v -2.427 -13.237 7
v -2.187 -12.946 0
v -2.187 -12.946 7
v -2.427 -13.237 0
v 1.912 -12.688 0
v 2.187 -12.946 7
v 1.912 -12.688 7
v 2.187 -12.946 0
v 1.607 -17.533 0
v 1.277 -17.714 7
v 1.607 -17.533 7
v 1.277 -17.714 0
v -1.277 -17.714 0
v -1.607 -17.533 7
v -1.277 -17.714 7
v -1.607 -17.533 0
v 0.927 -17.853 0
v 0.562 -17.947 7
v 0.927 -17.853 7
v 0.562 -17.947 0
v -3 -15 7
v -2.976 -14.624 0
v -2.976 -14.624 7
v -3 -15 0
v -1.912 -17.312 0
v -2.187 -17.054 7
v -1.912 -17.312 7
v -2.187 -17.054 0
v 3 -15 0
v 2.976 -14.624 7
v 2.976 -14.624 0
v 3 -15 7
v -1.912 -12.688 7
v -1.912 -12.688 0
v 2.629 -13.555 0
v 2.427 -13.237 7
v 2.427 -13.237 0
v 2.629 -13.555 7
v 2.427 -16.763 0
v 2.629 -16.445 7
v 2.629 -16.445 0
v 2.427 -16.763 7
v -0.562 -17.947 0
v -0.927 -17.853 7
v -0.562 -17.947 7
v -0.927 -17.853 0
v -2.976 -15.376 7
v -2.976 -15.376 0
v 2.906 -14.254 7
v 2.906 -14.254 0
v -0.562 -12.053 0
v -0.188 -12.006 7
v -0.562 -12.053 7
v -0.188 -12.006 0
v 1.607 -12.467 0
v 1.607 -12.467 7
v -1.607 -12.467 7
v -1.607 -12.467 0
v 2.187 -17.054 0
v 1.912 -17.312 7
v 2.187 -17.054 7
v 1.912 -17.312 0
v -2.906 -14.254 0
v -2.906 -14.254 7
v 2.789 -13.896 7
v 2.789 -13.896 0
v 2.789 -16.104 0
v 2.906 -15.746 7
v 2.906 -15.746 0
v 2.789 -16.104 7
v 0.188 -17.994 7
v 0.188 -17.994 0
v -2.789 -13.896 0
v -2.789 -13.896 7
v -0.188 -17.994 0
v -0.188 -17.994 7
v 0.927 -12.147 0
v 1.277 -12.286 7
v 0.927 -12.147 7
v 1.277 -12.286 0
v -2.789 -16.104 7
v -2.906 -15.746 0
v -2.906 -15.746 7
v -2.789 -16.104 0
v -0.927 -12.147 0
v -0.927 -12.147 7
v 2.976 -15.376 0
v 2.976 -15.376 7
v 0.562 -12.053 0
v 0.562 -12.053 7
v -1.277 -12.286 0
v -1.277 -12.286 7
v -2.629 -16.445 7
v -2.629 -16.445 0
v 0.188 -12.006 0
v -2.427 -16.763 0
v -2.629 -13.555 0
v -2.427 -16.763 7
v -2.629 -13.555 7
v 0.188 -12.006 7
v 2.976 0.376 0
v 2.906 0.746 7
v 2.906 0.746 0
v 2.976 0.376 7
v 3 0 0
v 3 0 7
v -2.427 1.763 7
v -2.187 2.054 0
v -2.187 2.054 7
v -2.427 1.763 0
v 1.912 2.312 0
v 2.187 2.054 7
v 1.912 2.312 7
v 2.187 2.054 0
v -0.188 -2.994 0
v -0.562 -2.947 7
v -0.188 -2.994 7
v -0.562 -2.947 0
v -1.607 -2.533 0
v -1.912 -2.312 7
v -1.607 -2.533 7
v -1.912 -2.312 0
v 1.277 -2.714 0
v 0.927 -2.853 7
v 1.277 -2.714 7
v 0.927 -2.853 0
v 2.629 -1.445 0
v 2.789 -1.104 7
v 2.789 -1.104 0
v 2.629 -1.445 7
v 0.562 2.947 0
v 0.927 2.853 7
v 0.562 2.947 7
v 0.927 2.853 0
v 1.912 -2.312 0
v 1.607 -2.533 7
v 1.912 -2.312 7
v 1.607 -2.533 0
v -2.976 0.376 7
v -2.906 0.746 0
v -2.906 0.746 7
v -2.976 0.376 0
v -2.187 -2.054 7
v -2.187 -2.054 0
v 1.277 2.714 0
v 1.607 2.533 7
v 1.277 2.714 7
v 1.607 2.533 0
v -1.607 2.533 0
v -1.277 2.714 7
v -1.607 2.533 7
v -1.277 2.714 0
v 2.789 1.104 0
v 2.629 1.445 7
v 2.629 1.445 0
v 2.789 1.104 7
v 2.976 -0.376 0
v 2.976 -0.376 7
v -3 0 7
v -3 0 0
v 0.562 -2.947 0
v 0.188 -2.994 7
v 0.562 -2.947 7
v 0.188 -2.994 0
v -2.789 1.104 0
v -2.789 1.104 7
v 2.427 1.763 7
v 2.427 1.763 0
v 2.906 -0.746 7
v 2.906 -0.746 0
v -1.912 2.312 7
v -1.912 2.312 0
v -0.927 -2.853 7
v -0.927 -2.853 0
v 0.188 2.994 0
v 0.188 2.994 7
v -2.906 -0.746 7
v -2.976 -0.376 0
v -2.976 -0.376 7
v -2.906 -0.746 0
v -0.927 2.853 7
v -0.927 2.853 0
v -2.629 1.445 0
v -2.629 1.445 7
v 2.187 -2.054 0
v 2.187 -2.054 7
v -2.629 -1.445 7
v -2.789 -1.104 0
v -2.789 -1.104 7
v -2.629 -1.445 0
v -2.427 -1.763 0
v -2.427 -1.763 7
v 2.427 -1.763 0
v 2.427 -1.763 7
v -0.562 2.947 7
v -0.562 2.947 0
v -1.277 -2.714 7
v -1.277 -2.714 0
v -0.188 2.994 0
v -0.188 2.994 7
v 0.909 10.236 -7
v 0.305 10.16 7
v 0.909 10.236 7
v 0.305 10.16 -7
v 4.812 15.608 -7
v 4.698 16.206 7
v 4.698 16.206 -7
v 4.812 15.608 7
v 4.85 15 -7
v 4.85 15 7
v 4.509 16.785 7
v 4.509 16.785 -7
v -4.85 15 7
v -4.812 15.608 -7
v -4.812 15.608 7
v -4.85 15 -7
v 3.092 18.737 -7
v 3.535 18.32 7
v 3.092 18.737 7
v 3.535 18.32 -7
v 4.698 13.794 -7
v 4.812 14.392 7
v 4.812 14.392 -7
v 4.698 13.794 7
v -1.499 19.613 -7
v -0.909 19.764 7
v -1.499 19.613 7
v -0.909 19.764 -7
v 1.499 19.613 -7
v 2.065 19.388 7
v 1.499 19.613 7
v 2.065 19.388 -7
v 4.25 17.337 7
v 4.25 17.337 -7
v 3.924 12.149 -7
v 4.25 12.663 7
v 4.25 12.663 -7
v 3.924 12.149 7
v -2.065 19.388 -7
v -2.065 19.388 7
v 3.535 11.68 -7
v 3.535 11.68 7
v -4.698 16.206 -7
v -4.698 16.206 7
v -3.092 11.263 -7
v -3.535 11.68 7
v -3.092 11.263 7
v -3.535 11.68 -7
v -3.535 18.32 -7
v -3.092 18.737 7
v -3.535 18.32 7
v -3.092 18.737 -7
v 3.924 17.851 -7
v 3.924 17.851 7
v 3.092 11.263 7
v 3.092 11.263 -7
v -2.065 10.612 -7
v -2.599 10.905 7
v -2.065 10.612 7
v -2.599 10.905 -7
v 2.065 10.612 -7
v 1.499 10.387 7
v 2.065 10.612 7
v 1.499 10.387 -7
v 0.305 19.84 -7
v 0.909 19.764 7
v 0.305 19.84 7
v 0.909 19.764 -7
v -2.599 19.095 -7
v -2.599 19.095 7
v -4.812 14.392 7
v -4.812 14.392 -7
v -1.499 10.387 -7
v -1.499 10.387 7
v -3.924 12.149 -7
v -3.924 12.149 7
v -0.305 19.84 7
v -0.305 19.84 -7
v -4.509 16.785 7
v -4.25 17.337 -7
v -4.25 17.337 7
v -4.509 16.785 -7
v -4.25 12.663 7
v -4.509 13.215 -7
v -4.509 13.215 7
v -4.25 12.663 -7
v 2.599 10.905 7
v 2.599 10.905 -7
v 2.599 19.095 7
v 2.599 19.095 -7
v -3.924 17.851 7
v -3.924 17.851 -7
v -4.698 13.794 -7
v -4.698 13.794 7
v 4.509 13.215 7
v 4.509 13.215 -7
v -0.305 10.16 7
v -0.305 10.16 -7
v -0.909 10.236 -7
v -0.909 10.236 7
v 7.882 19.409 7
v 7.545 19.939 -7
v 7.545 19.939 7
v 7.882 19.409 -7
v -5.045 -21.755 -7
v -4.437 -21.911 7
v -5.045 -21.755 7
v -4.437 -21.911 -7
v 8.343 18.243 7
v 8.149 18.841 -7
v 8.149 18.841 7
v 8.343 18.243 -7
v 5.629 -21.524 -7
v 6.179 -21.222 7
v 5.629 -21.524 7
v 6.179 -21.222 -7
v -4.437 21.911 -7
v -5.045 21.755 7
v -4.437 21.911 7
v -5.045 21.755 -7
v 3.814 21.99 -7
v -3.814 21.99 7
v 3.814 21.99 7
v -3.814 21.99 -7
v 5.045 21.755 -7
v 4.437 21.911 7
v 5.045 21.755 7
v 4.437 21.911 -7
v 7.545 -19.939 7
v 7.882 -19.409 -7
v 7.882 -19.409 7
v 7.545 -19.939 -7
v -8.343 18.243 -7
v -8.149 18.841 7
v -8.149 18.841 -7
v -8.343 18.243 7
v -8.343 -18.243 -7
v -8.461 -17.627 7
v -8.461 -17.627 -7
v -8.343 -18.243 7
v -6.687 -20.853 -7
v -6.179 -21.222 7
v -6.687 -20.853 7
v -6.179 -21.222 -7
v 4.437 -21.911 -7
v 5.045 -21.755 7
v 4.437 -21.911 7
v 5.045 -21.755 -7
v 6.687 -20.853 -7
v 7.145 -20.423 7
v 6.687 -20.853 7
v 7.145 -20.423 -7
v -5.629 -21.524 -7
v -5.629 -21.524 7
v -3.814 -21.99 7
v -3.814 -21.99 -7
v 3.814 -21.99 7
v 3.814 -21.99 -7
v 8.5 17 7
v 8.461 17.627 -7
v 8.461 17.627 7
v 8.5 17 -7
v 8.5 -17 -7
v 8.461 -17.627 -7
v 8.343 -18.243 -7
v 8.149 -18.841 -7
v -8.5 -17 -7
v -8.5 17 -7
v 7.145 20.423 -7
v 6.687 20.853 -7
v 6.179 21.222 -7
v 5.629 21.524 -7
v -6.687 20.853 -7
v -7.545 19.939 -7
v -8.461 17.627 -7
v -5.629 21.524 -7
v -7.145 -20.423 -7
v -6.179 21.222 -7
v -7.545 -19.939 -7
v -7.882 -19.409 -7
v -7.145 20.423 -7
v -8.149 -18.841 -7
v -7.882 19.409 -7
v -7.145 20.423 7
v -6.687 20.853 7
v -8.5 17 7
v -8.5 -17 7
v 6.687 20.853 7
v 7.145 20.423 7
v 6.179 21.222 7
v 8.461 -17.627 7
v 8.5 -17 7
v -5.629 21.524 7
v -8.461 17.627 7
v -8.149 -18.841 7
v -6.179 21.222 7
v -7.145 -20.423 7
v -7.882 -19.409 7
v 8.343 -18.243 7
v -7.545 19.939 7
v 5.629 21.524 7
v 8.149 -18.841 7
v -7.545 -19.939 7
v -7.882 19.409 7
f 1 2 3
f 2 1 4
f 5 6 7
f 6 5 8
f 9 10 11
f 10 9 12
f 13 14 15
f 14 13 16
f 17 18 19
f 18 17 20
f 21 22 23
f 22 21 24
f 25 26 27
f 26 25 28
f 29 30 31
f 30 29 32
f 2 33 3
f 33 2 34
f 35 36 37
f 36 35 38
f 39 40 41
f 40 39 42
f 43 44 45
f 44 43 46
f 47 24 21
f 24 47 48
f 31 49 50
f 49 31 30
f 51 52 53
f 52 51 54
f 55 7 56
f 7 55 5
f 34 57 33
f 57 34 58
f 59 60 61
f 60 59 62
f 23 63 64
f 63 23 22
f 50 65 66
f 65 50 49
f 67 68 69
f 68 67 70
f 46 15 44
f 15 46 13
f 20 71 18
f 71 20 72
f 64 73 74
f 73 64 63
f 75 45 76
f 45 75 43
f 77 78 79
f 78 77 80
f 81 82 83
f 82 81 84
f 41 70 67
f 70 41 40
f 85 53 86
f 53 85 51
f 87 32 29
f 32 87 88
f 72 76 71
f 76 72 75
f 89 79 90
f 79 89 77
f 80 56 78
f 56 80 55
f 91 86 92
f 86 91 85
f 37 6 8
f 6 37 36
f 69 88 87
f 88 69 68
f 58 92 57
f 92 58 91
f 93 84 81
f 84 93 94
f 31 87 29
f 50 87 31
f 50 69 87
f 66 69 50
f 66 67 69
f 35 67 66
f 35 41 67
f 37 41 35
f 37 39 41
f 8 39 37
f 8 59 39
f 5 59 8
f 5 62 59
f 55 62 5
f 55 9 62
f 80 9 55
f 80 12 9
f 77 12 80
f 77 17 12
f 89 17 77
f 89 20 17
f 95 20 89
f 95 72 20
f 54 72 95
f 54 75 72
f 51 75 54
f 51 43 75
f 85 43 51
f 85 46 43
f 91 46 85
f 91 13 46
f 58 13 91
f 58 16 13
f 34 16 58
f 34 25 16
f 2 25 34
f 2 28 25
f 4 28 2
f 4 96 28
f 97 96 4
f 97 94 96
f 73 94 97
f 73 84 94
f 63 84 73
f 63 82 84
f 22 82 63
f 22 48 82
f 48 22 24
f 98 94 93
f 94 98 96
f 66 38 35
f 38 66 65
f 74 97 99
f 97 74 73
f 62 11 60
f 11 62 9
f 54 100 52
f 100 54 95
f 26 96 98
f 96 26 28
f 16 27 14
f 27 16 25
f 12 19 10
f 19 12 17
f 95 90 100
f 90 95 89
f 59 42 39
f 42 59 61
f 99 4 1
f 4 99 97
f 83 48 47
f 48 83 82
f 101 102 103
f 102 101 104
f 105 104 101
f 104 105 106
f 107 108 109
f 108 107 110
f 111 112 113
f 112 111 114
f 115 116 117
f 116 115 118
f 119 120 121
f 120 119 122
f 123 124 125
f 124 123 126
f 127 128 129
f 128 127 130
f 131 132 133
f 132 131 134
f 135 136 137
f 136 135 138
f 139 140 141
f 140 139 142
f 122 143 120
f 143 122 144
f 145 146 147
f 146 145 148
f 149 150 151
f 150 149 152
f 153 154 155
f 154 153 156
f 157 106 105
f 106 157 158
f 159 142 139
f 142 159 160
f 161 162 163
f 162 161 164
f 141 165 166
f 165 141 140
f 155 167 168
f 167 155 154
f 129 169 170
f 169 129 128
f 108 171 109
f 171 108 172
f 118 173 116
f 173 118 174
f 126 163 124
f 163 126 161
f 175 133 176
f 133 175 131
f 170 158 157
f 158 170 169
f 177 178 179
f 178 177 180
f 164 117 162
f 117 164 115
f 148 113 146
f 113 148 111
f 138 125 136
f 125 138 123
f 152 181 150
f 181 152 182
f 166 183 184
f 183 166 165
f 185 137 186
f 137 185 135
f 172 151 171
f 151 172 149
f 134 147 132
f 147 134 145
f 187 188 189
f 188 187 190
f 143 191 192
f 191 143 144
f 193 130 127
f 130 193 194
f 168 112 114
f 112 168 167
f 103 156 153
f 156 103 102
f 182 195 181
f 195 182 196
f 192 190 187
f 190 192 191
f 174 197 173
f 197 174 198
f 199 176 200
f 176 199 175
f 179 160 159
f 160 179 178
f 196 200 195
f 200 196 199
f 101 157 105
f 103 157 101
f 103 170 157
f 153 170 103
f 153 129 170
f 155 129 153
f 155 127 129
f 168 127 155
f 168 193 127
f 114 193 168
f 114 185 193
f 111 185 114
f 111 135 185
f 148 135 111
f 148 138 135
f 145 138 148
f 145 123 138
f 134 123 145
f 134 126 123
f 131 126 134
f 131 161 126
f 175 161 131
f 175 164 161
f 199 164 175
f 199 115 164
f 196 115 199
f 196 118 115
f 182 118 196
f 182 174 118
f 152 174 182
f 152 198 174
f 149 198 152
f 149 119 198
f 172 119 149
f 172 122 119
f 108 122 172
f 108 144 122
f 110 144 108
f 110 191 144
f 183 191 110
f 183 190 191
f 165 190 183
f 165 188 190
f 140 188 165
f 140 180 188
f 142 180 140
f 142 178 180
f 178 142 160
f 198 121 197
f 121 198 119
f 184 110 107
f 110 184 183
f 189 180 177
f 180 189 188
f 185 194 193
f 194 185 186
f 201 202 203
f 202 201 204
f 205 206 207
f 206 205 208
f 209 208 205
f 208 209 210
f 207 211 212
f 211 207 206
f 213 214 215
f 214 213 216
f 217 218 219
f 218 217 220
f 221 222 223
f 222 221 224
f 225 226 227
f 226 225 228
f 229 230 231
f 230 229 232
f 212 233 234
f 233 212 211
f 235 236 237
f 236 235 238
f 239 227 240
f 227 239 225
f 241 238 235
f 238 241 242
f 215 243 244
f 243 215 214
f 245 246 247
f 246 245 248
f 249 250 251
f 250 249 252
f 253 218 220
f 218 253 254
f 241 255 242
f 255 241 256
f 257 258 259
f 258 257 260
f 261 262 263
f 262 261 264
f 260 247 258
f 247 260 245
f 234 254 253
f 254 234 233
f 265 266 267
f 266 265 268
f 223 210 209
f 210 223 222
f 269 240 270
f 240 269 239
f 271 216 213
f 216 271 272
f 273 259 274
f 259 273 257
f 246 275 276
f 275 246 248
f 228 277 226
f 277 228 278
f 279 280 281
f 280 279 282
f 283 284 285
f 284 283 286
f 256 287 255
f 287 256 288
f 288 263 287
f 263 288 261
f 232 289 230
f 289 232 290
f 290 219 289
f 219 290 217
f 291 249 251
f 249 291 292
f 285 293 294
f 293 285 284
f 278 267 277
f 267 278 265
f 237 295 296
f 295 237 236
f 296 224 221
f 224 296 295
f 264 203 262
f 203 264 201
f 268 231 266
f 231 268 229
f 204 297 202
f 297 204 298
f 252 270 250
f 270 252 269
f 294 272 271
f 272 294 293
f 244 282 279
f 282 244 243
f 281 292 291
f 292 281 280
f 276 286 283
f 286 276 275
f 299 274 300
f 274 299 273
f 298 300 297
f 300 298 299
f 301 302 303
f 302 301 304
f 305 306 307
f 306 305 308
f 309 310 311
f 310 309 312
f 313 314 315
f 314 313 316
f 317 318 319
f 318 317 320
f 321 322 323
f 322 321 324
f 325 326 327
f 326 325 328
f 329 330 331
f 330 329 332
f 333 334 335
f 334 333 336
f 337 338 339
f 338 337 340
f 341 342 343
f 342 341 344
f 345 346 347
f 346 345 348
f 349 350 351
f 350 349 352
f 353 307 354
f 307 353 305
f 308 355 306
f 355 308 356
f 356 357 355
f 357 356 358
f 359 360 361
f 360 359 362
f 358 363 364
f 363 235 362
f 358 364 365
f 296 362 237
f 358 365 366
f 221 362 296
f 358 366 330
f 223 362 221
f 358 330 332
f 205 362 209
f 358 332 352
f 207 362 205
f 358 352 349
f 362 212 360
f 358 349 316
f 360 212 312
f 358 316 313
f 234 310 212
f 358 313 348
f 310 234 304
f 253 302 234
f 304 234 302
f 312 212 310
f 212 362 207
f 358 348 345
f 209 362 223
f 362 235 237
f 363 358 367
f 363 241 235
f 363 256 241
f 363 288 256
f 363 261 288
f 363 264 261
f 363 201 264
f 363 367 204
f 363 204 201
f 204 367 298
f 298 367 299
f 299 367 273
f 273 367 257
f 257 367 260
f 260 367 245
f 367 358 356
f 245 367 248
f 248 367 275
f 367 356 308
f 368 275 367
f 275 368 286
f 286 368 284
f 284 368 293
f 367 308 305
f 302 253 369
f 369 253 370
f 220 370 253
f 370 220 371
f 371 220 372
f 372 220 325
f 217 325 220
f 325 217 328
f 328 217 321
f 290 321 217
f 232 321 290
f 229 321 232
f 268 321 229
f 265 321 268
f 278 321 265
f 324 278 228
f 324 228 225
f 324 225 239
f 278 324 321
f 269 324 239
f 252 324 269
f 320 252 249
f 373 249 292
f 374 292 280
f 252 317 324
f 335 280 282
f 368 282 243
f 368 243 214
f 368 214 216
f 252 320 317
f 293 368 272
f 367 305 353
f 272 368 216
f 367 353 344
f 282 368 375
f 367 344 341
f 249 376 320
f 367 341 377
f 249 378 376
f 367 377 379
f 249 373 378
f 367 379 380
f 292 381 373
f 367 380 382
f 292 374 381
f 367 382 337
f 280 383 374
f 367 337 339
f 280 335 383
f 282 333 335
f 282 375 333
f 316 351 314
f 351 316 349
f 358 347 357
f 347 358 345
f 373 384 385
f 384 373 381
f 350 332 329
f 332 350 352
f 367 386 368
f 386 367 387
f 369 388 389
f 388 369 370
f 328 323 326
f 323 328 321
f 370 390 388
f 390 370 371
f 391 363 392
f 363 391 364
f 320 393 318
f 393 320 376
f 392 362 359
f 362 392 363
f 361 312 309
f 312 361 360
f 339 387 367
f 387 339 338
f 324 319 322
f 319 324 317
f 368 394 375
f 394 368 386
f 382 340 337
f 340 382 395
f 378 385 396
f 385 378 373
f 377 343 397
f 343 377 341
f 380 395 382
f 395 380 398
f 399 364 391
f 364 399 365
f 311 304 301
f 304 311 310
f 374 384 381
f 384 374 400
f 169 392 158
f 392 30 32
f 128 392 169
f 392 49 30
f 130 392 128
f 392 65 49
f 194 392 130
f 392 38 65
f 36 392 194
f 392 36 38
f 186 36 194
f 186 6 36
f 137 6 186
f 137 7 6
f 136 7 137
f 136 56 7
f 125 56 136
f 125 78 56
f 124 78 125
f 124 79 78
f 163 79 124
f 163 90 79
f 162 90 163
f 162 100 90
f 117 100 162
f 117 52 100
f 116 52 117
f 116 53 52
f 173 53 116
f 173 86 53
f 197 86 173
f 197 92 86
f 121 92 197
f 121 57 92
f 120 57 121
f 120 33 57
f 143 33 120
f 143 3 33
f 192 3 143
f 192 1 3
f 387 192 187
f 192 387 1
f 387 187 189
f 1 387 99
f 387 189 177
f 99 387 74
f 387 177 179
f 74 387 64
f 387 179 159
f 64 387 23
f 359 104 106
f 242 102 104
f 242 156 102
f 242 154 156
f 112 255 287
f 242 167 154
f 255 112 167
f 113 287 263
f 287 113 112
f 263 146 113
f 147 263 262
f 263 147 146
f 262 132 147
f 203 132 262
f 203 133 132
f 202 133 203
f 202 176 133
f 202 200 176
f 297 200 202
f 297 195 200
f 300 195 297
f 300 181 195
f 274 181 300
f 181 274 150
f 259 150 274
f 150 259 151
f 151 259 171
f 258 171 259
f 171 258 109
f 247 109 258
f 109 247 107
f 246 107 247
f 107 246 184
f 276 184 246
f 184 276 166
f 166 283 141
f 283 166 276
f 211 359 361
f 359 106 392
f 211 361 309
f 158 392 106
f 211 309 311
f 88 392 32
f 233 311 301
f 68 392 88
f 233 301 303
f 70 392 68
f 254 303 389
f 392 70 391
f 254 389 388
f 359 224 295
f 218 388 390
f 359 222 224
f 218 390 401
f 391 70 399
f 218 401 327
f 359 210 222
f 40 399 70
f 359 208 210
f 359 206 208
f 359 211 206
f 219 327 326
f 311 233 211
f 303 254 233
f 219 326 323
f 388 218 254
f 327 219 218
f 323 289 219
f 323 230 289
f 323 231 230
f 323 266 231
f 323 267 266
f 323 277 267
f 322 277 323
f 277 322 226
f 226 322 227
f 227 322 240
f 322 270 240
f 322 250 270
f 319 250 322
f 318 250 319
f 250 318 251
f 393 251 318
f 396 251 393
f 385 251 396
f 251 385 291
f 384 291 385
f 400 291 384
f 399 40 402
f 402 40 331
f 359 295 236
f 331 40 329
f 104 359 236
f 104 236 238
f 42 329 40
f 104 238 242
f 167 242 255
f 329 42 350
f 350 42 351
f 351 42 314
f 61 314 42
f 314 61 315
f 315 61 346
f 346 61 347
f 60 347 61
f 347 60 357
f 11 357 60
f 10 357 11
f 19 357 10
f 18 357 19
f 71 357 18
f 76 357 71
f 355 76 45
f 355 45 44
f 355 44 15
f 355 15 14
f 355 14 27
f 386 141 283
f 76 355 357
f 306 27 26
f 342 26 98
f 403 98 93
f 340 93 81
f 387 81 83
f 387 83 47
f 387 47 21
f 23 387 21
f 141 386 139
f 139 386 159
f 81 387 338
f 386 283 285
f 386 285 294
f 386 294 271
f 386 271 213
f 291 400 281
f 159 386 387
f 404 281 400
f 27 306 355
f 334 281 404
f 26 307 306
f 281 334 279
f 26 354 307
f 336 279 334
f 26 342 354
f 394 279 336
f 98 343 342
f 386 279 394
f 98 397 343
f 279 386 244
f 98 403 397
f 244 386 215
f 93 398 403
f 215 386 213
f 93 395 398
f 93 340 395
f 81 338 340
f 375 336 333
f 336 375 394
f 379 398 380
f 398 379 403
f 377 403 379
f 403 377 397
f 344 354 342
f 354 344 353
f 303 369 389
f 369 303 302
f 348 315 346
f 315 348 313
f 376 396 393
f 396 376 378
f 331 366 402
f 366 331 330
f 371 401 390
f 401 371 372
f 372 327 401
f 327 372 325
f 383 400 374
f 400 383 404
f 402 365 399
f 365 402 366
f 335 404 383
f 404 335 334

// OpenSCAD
$fn = 50;


difference() {
	union() {
		translate(v = [0, 0, -7.0000000000]) {
			hull() {
				translate(v = [-3.5000000000, 17.0000000000, 0]) {
					cylinder(h = 14, r = 5);
				}
				translate(v = [3.5000000000, 17.0000000000, 0]) {
					cylinder(h = 14, r = 5);
				}
				translate(v = [-3.5000000000, -17.0000000000, 0]) {
					cylinder(h = 14, r = 5);
				}
				translate(v = [3.5000000000, -17.0000000000, 0]) {
					cylinder(h = 14, r = 5);
				}
			}
		}
	}
	union() {
		translate(v = [0.0000000000, -15.0000000000, 0]) {
			cylinder(h = 100, r = 3.0000000000);
		}
		cylinder(h = 100, r = 3.0000000000);
		translate(v = [0, 15, -100.0000000000]) {
			cylinder(h = 200, r = 4.8500000000);
		}
	}
}
